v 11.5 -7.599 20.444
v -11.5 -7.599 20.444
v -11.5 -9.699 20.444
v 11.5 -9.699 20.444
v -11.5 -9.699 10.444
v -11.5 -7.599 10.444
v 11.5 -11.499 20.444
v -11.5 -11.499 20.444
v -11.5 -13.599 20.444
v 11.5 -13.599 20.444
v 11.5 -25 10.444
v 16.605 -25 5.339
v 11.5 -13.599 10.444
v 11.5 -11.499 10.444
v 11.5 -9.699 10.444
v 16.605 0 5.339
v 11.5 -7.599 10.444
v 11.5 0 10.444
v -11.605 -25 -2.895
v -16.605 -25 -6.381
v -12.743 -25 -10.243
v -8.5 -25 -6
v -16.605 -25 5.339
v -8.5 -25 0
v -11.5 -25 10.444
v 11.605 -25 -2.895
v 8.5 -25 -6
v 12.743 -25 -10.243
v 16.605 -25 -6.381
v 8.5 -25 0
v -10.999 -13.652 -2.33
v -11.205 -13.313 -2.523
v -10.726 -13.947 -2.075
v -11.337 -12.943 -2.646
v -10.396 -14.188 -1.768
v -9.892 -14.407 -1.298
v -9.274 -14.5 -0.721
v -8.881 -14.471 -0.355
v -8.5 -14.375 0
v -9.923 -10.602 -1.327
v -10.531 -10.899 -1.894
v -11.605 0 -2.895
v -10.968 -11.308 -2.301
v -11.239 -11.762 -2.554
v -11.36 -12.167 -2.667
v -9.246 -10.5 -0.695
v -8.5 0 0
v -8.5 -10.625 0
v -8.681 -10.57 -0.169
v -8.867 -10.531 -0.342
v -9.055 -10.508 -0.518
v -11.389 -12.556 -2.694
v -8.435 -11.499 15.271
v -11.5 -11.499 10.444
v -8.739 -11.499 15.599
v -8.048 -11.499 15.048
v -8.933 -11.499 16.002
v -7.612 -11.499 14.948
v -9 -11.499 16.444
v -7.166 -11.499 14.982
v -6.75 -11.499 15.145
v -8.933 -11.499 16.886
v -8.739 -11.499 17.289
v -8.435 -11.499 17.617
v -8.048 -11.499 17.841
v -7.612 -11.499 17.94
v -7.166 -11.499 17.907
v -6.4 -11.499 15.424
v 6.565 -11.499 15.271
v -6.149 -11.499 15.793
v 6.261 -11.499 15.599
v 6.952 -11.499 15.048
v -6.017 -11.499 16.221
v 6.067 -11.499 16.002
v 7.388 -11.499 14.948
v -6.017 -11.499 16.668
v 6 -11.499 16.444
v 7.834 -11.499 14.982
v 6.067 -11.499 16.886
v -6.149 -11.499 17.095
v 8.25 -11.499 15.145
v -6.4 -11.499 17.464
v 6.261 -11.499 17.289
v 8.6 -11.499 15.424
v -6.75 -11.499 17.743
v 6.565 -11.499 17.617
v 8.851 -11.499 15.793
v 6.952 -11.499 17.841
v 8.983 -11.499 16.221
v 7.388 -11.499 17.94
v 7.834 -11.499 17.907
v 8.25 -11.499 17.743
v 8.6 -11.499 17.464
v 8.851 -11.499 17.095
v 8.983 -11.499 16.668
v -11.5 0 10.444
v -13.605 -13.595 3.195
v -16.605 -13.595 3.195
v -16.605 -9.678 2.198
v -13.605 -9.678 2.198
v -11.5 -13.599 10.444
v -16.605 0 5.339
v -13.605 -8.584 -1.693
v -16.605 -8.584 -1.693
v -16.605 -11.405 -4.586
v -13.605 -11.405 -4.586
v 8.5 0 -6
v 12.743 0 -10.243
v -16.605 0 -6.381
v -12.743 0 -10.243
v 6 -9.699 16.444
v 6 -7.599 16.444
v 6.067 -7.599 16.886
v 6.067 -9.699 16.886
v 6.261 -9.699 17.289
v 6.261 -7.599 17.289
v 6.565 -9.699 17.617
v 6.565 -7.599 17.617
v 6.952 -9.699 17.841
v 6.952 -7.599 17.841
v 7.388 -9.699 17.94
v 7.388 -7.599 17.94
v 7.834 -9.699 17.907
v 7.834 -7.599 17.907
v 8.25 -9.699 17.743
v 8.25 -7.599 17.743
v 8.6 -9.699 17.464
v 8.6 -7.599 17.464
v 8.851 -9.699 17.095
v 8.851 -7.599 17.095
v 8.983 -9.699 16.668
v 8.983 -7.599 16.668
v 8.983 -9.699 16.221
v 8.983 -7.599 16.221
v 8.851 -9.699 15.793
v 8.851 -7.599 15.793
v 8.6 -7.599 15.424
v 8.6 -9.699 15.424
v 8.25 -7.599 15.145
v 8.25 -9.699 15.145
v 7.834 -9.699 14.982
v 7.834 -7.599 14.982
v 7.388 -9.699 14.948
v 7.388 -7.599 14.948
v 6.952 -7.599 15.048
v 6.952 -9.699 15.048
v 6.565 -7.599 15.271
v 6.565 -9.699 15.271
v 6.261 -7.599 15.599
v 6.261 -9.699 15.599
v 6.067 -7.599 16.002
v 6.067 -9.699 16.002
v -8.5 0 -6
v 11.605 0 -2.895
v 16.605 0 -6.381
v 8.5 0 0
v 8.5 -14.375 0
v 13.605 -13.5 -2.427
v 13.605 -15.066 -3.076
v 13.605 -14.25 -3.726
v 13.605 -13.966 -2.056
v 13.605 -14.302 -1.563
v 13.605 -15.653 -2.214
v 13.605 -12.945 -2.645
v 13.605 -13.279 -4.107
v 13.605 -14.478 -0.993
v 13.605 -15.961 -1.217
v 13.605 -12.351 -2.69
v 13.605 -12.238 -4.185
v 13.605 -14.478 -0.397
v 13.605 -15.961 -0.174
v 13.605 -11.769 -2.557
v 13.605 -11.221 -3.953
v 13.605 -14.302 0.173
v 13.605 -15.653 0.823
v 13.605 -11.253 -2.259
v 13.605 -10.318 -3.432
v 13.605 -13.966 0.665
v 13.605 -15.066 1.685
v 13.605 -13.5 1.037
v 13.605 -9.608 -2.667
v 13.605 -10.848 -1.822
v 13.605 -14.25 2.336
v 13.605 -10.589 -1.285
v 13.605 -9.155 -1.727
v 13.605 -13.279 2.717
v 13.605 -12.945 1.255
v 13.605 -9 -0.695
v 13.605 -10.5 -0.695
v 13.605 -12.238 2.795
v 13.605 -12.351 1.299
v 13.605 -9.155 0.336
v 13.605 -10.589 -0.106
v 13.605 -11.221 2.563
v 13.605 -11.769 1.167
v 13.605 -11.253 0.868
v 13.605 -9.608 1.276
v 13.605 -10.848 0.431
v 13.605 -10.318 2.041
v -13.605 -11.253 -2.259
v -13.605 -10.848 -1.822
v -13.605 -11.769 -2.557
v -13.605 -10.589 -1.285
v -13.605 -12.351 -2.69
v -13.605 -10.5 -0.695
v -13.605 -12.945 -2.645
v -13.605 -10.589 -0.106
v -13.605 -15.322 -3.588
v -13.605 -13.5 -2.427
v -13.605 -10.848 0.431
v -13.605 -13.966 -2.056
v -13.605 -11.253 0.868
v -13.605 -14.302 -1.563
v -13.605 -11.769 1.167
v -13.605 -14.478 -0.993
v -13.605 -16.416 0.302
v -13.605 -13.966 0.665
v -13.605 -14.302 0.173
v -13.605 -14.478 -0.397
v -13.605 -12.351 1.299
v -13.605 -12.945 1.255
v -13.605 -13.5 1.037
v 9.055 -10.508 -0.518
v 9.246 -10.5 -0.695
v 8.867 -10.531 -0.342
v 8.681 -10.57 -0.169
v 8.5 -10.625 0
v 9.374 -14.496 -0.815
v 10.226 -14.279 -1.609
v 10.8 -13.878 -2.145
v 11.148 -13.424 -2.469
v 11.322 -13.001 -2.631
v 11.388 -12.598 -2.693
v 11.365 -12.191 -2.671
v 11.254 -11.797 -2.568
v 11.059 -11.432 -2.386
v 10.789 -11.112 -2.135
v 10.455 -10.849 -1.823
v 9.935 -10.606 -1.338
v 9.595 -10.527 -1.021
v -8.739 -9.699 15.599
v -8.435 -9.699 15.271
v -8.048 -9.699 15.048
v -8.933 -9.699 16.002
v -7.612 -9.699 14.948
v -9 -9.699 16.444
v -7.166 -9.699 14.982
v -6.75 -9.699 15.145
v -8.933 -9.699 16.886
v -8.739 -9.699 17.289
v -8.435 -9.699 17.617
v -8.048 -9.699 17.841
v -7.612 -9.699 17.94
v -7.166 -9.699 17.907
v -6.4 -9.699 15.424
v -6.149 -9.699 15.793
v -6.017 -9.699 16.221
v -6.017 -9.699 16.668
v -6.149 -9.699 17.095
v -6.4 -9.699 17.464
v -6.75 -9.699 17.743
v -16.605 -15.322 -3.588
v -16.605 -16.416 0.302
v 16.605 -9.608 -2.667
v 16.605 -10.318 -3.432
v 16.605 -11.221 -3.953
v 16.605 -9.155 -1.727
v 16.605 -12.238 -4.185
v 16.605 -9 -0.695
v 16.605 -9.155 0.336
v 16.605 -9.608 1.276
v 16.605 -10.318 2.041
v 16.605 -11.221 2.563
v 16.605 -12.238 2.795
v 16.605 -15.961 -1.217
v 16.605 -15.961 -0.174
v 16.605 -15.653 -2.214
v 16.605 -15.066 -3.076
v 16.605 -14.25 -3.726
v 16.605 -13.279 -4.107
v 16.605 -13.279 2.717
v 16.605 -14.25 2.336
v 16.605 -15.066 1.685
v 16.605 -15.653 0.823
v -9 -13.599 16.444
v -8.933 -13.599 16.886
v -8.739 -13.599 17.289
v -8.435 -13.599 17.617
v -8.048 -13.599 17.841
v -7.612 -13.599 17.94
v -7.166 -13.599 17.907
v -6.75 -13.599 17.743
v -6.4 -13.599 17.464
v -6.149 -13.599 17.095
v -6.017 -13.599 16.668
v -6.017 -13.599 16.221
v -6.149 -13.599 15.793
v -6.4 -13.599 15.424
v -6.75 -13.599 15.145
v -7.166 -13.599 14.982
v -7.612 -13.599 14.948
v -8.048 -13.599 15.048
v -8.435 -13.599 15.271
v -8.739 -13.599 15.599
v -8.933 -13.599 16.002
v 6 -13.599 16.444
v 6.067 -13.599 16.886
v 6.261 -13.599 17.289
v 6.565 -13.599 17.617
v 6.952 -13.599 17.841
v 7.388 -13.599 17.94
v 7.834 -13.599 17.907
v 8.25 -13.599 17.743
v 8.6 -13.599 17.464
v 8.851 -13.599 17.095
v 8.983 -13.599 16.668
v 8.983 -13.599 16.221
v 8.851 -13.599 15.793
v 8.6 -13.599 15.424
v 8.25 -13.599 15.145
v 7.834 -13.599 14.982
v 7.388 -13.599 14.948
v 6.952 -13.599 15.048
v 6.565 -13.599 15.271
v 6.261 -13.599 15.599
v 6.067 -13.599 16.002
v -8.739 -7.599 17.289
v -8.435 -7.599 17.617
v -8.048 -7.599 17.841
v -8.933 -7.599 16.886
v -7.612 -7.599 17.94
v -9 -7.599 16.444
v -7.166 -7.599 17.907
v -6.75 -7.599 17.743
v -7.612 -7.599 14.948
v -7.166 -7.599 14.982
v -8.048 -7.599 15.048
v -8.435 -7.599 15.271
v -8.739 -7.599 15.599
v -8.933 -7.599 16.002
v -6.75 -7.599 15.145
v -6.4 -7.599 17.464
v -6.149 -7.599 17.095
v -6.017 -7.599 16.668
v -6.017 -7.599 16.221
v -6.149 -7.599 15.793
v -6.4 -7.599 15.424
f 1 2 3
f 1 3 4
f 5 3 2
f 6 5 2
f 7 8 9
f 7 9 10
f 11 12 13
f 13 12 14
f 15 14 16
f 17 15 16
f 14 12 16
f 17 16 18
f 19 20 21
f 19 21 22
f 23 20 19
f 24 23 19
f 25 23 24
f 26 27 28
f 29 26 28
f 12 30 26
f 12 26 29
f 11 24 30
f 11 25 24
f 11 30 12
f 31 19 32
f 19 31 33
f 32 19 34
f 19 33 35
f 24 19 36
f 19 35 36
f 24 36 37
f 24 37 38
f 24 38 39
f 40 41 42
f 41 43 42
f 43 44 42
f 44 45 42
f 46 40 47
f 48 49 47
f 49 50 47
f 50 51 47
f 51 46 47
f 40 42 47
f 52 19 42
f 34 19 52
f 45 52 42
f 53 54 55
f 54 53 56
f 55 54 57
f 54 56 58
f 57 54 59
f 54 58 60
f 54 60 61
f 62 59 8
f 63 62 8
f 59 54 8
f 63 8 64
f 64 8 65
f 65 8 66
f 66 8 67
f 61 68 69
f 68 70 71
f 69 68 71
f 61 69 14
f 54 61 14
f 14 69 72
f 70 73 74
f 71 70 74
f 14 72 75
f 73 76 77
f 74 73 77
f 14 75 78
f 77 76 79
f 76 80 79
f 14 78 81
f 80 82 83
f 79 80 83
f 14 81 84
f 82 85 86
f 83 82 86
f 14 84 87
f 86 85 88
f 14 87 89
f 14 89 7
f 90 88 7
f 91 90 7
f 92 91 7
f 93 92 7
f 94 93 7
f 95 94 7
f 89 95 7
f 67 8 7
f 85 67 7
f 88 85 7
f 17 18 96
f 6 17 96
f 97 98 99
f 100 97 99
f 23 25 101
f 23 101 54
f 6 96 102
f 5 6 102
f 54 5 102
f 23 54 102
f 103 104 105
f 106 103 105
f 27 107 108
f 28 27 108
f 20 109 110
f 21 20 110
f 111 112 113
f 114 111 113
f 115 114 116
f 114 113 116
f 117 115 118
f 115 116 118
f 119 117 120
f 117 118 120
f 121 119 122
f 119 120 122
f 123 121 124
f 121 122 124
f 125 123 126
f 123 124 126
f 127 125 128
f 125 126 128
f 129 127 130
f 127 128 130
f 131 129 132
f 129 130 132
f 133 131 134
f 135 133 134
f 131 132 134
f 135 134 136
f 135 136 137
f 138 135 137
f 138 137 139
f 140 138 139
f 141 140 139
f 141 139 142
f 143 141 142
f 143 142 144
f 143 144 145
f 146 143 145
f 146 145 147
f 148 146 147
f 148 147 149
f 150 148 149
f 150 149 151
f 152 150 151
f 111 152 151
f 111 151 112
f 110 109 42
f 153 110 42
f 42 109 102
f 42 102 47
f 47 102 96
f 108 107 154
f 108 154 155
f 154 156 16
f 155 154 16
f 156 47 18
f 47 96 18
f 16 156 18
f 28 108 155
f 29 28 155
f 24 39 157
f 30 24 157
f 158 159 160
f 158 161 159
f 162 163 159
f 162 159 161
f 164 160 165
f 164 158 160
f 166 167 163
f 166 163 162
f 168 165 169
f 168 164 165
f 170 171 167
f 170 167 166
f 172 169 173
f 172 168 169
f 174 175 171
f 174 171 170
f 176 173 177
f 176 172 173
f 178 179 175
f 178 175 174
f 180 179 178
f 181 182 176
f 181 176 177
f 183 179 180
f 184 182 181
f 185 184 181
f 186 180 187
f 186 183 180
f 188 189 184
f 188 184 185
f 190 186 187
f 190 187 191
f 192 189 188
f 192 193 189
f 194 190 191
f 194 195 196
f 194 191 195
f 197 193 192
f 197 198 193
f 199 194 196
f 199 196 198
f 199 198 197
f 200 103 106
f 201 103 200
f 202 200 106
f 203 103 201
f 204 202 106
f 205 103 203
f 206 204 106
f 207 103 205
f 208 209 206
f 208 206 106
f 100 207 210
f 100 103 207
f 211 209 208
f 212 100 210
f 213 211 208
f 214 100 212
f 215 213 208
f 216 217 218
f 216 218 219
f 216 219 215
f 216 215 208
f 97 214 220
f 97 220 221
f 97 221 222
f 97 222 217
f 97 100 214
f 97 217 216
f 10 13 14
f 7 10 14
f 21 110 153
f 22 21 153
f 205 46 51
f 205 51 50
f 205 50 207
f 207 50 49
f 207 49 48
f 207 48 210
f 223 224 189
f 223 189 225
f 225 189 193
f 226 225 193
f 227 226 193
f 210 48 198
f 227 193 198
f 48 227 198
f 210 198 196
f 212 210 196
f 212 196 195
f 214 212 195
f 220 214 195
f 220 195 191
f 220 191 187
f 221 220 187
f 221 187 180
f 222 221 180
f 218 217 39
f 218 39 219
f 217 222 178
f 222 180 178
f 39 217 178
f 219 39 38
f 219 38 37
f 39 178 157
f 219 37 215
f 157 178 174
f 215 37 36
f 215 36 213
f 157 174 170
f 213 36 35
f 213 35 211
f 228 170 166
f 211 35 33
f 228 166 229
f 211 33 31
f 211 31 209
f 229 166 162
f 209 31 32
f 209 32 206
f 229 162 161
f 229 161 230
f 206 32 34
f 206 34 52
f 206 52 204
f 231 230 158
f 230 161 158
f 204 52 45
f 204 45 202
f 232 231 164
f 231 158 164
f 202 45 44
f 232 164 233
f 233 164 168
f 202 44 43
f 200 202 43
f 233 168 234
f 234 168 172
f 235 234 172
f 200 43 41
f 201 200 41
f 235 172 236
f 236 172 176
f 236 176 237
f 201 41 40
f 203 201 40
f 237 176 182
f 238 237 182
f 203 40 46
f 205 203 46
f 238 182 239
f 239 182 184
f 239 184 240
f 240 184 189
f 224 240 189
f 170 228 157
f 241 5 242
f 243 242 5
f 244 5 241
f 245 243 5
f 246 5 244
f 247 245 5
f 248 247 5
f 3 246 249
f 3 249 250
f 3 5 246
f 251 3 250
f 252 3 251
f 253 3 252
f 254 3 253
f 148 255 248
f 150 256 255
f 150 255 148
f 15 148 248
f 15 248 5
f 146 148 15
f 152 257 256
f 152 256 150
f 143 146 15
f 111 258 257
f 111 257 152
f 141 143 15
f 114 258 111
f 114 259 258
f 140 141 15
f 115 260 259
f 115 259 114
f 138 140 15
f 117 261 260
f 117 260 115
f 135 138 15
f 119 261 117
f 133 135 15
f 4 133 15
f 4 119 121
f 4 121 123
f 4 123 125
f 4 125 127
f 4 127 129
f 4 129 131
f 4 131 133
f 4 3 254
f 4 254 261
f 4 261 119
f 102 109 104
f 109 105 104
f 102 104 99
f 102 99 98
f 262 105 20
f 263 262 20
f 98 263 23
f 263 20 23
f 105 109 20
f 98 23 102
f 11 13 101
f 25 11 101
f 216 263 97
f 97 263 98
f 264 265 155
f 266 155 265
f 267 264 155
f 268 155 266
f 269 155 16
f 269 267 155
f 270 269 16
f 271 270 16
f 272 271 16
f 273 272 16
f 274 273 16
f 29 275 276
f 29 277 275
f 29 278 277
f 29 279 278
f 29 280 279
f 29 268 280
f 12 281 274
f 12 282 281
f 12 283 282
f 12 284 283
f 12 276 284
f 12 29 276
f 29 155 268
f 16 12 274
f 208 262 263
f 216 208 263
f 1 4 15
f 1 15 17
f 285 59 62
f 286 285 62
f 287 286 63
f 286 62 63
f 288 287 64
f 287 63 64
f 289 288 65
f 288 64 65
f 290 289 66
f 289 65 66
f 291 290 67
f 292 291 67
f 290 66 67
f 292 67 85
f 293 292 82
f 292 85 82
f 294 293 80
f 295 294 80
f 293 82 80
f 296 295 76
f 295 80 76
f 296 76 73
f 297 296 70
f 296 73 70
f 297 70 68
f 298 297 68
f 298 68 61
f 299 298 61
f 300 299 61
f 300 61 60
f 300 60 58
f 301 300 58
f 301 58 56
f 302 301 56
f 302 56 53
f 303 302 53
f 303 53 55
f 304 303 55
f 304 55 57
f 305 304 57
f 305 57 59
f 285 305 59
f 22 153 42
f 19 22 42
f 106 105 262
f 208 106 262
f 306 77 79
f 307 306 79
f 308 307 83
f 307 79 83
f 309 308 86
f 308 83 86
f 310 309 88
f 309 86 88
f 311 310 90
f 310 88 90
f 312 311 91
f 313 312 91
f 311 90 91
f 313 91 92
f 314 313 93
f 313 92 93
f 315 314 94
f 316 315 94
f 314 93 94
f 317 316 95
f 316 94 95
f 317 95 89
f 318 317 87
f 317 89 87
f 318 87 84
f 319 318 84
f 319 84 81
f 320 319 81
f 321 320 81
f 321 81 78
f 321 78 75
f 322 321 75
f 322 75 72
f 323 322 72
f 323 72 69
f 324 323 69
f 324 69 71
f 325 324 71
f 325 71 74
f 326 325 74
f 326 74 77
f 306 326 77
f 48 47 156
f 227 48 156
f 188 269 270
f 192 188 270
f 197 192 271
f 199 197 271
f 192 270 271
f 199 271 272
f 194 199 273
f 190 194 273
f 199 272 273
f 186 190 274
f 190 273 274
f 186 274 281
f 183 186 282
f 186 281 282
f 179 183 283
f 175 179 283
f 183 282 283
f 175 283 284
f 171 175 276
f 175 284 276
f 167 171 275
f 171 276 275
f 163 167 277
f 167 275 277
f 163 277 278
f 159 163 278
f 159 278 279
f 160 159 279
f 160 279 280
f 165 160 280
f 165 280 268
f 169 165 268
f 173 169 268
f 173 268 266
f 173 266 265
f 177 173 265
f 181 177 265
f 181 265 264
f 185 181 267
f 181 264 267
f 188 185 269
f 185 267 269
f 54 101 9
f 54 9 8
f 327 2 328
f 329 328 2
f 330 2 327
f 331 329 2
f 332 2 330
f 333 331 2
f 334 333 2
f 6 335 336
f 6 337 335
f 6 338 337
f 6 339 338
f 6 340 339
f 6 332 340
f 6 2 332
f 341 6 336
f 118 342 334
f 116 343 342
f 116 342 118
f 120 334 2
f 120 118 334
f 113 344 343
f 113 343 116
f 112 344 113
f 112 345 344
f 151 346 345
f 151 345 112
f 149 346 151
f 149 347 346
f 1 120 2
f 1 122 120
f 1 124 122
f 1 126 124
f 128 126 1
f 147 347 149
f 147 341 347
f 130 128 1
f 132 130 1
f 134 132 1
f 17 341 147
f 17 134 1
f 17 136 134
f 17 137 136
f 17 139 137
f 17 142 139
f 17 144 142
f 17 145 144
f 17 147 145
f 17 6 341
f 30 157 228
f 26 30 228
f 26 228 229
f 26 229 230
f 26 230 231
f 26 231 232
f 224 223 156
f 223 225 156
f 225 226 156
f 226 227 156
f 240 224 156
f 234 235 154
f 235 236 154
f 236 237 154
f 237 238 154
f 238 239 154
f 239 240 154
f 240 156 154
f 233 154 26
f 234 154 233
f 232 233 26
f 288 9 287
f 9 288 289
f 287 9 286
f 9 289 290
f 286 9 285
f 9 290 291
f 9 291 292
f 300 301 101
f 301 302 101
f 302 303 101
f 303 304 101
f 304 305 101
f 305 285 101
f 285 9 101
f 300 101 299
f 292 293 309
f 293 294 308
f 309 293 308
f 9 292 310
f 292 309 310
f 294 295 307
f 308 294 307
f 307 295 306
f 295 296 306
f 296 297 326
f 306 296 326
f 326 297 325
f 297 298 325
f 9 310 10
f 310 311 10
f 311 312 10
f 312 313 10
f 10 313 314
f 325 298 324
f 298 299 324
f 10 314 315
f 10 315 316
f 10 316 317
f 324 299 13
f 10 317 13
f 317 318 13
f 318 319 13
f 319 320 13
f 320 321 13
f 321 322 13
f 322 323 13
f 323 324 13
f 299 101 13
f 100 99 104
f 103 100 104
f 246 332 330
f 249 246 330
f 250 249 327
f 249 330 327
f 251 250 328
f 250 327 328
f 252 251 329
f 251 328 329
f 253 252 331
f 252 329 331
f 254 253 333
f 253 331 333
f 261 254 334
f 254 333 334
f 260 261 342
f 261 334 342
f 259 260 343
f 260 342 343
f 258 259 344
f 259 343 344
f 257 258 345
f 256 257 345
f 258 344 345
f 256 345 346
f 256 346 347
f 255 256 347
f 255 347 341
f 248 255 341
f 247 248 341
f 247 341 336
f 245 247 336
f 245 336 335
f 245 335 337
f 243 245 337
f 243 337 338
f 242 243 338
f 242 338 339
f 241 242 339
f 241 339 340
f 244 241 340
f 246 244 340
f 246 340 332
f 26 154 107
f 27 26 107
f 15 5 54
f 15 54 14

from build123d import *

# Parameters (mm, degrees)
F1_DEPTH  = 25
F2_W      = 7.596032
F2_H      = 21.10009
F2_W_2    = 10.268714
F2_H_2    = 30.102797
F3_DEPTH  = 25
F4_R      = 2
F5_DEPTH  = 35
F6_R      = 3.5
F7_DEPTH  = 3
F9_DEPTH  = 3
F10_W     = 23
F10_H     = 6
F11_DEPTH = 10
F12_W     = 23
F12_H     = 1.8
F13_DEPTH = 10
F14_R     = 1.5
F15_DEPTH = 25


with BuildPart() as f1:
    # F0 (on Front) → F1 (new body)
    with BuildSketch(Plane.XZ):
        Polygon((-11.604762, -2.895238), (-8.5, 0), (8.5, 0), (11.604762, -2.895238), (8.5, -6), (12.742641, -10.242641), (22.464761, -0.520521), (11.5, 10.44424), (-11.5, 10.44424), (-22.464761, -0.520521), (-12.742641, -10.242641), (-8.5, -6), align=None)
    extrude(amount=F1_DEPTH)

    # F2 (on face) → F3 (cut)
    with BuildSketch(Plane.XZ.offset(25)):
        with Locations((-20.402778, -0.557668)):
            Rectangle(F2_W, F2_H)
        with Locations((21.739119, -1.542339)):
            Rectangle(F2_W_2, F2_H_2)
    extrude(amount=-F3_DEPTH, mode=Mode.SUBTRACT)

    # F4 (on face) → F5 (cut)
    with BuildSketch(Plane.YZ.offset(16.604762)):
        with Locations((-12.5, -0.695238)):
            Circle(F4_R)
    extrude(amount=-F5_DEPTH, mode=Mode.SUBTRACT)

    # F6 (on face) → F7 (cut)
    with BuildSketch(Plane.YZ.offset(16.604762)):
        with Locations((-12.5, -0.695238)):
            Circle(F6_R)
    extrude(amount=-F7_DEPTH, mode=Mode.SUBTRACT)

    # F8 (on face) → F9 (cut)
    with BuildSketch(Plane(origin=(-16.604762, 0, 0), x_dir=(0, -1, 0), z_dir=(-1, 0, 0))):
        Polygon((15.321942, -3.588329), (16.416462, 0.30209), (13.59452, 3.195181), (9.678058, 2.197854), (8.583538, -1.692565), (11.40548, -4.585657), align=None)
    extrude(amount=-F9_DEPTH, mode=Mode.SUBTRACT)

    # F10 (on face) → F11 (join)
    with BuildSketch(Plane.XY.offset(10.44424)):
        with Locations((0, -10.598838)):
            Rectangle(F10_W, F10_H)
    extrude(amount=F11_DEPTH)

    # F12 (on face) → F13 (cut)
    with BuildSketch(Plane.XY.offset(20.44424)):
        with Locations((0, -10.598838)):
            Rectangle(F12_W, F12_H)
    extrude(amount=-F13_DEPTH, mode=Mode.SUBTRACT)

    # F14 (on face) → F15 (cut)
    with BuildSketch(Plane(origin=(0, -7.598838, 0), x_dir=(-1, 0, 0), z_dir=(0, 1, 0))):
        with Locations((-7.5, 16.44424)):
            Circle(F14_R)
        with Locations((7.5, 16.44424)):
            Circle(F14_R)
    extrude(amount=-F15_DEPTH, mode=Mode.SUBTRACT)


solid = f1.part
